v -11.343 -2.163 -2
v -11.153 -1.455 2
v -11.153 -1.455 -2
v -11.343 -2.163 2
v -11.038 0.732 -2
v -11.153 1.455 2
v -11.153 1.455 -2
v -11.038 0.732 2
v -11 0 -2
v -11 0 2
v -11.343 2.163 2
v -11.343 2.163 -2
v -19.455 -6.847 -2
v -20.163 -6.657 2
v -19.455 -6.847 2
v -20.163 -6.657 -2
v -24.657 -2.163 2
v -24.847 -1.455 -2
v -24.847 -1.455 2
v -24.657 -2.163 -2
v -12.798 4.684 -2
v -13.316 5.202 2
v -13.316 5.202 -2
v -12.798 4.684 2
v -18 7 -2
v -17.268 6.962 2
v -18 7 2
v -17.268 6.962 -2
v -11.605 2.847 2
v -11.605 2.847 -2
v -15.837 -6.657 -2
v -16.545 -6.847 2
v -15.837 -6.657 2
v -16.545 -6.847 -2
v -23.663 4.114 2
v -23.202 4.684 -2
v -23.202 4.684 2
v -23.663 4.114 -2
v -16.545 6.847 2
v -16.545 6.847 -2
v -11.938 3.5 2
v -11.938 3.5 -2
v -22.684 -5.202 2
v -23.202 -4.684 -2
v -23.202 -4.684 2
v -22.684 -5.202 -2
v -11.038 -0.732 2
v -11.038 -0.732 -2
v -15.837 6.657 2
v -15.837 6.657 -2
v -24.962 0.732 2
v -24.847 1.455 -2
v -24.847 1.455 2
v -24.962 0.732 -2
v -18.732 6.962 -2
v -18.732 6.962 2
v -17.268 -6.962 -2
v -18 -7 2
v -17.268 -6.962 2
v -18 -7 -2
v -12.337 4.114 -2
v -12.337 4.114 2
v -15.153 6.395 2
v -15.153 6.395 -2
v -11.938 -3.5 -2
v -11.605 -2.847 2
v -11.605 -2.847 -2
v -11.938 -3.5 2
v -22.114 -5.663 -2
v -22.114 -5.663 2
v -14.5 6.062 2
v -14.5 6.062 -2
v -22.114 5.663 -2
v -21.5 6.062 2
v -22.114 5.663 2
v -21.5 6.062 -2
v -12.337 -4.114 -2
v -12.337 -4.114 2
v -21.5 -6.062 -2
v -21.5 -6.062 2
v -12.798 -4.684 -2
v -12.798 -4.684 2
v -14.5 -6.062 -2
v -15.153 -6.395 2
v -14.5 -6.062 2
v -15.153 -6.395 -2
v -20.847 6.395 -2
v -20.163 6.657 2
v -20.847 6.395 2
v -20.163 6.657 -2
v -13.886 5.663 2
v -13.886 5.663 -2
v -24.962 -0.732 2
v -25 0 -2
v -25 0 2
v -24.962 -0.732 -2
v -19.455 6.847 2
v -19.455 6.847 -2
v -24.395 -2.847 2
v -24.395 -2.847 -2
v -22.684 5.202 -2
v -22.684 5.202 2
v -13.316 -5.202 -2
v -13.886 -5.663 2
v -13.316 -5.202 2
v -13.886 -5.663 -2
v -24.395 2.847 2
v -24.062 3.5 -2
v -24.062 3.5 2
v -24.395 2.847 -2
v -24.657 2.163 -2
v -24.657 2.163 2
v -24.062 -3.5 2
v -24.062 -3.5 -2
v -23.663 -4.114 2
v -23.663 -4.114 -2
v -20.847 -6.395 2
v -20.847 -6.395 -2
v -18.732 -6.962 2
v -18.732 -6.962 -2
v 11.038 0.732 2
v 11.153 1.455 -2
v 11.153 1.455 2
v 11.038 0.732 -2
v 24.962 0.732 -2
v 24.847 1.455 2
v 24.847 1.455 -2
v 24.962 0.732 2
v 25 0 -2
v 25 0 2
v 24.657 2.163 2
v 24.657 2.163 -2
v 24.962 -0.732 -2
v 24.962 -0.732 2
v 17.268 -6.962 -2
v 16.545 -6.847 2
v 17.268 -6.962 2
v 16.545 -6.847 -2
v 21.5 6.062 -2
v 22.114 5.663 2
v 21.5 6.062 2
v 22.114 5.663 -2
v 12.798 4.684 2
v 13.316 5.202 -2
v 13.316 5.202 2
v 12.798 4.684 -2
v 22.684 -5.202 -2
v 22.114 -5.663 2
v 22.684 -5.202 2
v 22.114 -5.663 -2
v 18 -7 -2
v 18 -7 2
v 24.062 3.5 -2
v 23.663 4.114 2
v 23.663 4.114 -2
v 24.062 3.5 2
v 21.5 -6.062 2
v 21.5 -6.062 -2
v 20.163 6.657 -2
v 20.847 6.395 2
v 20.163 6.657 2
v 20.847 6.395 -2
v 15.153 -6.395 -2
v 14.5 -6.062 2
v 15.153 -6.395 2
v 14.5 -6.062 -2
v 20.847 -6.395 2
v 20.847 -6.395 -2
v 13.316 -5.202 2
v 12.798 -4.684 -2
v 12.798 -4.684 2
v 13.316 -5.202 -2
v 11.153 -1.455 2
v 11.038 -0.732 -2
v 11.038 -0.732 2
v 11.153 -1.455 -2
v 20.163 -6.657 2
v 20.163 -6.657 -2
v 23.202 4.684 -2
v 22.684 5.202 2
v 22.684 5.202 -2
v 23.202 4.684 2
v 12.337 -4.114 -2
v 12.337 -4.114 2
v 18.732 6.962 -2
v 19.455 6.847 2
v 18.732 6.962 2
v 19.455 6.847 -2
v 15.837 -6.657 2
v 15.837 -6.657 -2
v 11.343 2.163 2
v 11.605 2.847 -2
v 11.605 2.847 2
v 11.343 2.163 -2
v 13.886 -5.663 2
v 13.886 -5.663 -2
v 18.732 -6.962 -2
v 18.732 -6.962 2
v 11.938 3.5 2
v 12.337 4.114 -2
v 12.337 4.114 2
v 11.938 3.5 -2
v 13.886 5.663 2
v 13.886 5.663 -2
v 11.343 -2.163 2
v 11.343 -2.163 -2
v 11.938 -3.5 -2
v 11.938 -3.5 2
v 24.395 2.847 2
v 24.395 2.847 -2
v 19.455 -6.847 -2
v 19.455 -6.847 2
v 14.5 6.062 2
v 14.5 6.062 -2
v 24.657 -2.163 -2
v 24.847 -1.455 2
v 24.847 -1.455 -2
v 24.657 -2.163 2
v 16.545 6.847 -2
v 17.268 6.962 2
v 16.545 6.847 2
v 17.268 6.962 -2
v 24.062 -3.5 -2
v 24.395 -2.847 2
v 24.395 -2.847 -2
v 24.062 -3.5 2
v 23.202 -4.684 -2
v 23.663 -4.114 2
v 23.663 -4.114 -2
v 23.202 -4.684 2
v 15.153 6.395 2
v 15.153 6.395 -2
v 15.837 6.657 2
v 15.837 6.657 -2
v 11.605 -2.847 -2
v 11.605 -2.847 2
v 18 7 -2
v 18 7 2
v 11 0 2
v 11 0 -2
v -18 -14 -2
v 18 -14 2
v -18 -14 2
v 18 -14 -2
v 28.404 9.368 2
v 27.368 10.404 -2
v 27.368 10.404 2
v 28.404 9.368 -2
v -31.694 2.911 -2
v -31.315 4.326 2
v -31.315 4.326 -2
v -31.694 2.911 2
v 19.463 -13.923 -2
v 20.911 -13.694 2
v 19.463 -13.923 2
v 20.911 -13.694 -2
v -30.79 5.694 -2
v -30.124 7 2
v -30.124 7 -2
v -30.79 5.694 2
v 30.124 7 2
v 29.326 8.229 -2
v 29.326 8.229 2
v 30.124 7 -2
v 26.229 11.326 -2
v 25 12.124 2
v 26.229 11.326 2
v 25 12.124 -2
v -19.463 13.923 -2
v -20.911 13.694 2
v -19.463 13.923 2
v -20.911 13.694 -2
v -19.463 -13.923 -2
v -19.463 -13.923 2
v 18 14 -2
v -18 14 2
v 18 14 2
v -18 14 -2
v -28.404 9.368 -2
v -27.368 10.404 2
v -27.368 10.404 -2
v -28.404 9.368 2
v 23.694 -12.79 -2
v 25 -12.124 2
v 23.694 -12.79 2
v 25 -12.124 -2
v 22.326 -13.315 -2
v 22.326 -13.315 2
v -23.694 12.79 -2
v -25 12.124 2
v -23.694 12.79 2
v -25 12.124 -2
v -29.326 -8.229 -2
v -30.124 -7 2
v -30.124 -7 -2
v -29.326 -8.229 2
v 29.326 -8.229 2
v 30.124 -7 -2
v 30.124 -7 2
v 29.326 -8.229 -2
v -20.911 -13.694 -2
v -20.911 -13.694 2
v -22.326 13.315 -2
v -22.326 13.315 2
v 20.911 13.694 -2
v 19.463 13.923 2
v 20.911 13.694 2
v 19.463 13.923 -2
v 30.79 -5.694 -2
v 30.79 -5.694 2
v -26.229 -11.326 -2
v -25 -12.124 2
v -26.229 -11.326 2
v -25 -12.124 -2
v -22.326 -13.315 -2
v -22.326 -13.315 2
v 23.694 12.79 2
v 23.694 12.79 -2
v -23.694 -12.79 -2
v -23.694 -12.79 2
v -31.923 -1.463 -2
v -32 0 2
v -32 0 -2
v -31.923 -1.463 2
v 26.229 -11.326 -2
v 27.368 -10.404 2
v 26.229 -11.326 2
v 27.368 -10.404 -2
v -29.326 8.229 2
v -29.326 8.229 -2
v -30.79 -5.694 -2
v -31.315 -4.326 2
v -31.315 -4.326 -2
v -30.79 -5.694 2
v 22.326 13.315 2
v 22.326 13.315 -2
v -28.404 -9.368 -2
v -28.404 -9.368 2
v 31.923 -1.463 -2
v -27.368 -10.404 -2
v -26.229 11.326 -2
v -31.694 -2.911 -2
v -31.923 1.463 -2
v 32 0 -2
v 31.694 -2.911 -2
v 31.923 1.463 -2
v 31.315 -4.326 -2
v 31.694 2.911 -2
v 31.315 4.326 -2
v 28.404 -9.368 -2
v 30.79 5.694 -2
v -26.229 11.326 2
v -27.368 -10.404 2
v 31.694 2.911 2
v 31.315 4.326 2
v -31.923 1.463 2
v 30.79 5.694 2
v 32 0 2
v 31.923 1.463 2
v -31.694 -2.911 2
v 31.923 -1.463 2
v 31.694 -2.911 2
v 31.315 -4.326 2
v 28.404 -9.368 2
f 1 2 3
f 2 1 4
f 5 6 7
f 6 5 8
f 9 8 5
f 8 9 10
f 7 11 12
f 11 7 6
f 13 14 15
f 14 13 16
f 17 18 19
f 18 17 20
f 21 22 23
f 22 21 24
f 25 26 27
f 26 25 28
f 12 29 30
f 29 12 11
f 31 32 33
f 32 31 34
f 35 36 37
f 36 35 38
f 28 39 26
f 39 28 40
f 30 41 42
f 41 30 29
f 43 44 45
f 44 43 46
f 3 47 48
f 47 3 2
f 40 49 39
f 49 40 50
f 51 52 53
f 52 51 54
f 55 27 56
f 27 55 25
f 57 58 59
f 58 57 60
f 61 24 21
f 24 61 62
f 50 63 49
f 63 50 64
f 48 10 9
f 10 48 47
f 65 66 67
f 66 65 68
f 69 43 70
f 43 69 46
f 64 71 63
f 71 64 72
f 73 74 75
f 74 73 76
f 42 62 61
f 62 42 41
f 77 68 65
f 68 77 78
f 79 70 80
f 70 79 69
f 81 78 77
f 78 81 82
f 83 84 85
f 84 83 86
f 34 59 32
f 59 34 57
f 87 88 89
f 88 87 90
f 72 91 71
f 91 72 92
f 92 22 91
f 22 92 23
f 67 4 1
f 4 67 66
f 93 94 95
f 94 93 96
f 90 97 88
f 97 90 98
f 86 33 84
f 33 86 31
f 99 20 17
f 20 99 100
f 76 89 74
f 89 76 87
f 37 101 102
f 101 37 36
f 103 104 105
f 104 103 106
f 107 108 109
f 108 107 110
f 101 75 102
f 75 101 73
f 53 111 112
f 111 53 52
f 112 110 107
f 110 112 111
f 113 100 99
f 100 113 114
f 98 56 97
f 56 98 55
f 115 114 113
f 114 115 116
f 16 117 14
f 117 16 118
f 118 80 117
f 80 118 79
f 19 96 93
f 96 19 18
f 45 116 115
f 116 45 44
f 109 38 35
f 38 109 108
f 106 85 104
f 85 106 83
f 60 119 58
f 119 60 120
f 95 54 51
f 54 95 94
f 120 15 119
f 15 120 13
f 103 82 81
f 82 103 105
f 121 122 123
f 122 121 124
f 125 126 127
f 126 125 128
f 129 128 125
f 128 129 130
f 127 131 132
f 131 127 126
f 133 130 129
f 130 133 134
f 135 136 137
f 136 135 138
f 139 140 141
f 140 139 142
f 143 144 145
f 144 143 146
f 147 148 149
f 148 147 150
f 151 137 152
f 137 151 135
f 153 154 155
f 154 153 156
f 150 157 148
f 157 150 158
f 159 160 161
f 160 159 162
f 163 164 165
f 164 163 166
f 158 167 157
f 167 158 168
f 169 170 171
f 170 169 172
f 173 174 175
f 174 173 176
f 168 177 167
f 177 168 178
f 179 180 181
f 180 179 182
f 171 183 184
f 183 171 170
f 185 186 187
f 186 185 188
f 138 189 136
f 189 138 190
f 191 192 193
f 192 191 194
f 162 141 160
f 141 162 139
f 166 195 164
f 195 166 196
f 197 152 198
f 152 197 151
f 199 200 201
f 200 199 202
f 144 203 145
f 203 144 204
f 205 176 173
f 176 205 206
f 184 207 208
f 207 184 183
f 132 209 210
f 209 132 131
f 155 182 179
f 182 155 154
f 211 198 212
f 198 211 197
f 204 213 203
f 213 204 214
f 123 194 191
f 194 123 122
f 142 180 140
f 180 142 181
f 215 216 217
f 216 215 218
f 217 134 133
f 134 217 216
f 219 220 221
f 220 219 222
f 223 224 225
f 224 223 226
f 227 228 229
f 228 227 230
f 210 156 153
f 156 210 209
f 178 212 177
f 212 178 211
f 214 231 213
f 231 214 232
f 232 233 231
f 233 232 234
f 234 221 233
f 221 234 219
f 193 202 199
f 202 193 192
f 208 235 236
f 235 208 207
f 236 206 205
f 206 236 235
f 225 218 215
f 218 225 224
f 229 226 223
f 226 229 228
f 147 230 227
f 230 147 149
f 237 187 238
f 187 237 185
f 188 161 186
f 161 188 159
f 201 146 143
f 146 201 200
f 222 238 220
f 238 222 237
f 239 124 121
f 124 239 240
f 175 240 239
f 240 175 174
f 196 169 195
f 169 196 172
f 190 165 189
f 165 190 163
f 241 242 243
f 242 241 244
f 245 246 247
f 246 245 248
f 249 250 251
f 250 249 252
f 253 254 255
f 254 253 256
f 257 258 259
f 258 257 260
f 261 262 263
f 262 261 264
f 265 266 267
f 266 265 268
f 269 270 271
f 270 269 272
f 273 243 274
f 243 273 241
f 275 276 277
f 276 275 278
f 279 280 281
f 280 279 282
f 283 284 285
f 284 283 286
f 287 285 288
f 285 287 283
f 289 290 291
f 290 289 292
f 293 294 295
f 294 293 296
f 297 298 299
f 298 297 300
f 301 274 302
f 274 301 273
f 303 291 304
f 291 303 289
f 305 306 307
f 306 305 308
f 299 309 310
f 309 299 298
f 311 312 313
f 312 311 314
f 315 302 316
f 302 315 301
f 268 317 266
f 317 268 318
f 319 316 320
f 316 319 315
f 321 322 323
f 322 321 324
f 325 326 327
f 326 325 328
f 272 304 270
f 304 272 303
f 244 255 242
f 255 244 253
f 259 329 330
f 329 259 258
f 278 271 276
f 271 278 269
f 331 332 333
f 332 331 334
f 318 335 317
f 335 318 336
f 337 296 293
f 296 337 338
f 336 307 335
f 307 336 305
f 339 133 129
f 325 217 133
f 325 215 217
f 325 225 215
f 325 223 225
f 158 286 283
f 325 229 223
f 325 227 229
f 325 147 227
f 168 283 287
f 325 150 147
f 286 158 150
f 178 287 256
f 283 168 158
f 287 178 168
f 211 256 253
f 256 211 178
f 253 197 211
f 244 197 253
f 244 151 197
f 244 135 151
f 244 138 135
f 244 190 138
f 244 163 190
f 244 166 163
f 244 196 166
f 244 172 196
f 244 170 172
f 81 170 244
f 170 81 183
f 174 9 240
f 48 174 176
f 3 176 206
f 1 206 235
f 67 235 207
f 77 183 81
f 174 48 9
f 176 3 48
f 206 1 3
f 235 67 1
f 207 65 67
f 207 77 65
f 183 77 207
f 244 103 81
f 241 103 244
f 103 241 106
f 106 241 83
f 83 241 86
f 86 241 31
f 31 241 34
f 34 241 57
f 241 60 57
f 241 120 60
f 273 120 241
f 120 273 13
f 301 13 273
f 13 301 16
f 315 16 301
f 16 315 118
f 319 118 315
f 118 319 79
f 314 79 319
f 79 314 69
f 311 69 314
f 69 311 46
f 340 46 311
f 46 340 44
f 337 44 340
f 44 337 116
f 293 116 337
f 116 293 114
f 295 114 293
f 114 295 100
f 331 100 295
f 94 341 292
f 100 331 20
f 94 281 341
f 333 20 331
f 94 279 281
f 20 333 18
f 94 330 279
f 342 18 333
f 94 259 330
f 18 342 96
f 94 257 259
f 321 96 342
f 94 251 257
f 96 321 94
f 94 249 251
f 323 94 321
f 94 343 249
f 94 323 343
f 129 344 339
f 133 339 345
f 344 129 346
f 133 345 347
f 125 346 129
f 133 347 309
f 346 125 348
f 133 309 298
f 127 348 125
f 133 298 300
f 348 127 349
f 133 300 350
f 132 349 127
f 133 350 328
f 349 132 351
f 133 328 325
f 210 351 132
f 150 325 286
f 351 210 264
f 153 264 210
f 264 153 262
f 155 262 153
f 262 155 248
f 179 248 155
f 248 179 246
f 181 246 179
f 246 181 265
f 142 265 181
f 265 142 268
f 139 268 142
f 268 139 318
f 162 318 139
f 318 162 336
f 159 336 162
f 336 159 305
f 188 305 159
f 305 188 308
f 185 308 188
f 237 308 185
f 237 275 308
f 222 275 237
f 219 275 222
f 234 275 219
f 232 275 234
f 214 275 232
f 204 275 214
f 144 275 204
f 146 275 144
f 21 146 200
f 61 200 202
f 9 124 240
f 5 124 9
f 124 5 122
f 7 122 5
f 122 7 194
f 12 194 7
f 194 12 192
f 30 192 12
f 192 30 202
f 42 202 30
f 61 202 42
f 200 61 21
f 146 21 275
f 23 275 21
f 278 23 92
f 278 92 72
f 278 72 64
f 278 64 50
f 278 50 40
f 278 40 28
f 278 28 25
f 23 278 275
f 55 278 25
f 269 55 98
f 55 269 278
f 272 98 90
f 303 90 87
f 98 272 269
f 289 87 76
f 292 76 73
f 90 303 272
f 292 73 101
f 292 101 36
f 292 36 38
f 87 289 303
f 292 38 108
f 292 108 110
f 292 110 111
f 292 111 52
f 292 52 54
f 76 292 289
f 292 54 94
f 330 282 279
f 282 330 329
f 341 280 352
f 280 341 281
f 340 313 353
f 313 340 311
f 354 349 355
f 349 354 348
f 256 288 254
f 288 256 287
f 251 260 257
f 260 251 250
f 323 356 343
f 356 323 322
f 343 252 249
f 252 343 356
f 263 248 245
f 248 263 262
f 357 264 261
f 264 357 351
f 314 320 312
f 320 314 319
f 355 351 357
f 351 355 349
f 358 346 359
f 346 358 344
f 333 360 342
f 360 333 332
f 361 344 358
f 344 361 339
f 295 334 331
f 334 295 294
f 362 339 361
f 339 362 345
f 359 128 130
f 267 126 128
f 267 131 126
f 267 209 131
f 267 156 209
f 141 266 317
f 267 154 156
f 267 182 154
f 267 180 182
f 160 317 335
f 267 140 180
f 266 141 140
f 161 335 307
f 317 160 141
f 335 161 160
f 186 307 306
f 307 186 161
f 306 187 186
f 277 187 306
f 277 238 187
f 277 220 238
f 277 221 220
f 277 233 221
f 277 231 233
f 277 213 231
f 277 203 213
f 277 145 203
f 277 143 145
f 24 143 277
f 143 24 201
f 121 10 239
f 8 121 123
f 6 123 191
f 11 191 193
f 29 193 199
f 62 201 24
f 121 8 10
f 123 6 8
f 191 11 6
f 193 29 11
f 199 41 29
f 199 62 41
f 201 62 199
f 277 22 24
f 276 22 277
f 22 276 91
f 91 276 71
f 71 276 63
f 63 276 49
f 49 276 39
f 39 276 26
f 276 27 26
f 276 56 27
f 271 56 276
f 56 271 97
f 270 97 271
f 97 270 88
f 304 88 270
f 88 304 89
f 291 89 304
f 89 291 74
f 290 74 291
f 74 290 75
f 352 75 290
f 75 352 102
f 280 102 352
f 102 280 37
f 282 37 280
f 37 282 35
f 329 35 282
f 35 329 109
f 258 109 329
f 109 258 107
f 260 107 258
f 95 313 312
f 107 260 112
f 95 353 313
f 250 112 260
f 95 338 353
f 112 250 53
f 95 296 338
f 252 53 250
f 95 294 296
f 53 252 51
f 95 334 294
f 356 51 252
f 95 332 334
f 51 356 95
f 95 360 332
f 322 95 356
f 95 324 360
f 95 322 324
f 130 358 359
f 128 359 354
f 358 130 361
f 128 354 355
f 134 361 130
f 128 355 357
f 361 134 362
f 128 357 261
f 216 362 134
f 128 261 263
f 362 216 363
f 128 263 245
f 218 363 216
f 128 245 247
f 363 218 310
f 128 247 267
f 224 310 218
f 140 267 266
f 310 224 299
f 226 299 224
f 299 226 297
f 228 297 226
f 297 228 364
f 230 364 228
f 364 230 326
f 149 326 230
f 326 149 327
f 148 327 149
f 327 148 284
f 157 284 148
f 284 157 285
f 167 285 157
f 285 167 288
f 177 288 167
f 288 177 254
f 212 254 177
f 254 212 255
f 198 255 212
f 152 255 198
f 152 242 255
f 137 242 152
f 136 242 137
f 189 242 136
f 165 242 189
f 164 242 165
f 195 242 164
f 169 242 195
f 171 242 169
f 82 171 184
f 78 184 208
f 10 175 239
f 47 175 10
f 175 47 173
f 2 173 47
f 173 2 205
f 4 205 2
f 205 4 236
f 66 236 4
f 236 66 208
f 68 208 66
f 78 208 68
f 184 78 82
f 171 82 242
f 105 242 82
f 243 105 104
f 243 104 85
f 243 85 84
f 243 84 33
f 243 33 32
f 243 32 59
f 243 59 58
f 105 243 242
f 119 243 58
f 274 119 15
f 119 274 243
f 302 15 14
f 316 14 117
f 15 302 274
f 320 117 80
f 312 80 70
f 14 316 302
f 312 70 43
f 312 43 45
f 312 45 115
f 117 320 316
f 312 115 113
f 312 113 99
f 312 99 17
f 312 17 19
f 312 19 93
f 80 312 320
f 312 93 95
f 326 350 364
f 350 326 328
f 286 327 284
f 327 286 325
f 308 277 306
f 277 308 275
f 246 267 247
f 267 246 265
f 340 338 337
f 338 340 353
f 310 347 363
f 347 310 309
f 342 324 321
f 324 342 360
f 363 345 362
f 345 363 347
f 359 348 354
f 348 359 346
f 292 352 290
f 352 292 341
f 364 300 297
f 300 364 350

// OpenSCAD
// Two-hole link plate.
$fn = 60;
eps = 0.02;
hole_d = 14;
length = 64;
width = 28;
thickness = 4;
difference() { hull() { translate([-length/2+width/2,0,0]) cylinder(d=width,h=thickness,center=true); translate([length/2-width/2,0,0]) cylinder(d=width,h=thickness,center=true); } for(x=[-length/2+width/2,length/2-width/2]) translate([x,0,-thickness/2-eps]) cylinder(d=hole_d,h=thickness+2*eps); }
